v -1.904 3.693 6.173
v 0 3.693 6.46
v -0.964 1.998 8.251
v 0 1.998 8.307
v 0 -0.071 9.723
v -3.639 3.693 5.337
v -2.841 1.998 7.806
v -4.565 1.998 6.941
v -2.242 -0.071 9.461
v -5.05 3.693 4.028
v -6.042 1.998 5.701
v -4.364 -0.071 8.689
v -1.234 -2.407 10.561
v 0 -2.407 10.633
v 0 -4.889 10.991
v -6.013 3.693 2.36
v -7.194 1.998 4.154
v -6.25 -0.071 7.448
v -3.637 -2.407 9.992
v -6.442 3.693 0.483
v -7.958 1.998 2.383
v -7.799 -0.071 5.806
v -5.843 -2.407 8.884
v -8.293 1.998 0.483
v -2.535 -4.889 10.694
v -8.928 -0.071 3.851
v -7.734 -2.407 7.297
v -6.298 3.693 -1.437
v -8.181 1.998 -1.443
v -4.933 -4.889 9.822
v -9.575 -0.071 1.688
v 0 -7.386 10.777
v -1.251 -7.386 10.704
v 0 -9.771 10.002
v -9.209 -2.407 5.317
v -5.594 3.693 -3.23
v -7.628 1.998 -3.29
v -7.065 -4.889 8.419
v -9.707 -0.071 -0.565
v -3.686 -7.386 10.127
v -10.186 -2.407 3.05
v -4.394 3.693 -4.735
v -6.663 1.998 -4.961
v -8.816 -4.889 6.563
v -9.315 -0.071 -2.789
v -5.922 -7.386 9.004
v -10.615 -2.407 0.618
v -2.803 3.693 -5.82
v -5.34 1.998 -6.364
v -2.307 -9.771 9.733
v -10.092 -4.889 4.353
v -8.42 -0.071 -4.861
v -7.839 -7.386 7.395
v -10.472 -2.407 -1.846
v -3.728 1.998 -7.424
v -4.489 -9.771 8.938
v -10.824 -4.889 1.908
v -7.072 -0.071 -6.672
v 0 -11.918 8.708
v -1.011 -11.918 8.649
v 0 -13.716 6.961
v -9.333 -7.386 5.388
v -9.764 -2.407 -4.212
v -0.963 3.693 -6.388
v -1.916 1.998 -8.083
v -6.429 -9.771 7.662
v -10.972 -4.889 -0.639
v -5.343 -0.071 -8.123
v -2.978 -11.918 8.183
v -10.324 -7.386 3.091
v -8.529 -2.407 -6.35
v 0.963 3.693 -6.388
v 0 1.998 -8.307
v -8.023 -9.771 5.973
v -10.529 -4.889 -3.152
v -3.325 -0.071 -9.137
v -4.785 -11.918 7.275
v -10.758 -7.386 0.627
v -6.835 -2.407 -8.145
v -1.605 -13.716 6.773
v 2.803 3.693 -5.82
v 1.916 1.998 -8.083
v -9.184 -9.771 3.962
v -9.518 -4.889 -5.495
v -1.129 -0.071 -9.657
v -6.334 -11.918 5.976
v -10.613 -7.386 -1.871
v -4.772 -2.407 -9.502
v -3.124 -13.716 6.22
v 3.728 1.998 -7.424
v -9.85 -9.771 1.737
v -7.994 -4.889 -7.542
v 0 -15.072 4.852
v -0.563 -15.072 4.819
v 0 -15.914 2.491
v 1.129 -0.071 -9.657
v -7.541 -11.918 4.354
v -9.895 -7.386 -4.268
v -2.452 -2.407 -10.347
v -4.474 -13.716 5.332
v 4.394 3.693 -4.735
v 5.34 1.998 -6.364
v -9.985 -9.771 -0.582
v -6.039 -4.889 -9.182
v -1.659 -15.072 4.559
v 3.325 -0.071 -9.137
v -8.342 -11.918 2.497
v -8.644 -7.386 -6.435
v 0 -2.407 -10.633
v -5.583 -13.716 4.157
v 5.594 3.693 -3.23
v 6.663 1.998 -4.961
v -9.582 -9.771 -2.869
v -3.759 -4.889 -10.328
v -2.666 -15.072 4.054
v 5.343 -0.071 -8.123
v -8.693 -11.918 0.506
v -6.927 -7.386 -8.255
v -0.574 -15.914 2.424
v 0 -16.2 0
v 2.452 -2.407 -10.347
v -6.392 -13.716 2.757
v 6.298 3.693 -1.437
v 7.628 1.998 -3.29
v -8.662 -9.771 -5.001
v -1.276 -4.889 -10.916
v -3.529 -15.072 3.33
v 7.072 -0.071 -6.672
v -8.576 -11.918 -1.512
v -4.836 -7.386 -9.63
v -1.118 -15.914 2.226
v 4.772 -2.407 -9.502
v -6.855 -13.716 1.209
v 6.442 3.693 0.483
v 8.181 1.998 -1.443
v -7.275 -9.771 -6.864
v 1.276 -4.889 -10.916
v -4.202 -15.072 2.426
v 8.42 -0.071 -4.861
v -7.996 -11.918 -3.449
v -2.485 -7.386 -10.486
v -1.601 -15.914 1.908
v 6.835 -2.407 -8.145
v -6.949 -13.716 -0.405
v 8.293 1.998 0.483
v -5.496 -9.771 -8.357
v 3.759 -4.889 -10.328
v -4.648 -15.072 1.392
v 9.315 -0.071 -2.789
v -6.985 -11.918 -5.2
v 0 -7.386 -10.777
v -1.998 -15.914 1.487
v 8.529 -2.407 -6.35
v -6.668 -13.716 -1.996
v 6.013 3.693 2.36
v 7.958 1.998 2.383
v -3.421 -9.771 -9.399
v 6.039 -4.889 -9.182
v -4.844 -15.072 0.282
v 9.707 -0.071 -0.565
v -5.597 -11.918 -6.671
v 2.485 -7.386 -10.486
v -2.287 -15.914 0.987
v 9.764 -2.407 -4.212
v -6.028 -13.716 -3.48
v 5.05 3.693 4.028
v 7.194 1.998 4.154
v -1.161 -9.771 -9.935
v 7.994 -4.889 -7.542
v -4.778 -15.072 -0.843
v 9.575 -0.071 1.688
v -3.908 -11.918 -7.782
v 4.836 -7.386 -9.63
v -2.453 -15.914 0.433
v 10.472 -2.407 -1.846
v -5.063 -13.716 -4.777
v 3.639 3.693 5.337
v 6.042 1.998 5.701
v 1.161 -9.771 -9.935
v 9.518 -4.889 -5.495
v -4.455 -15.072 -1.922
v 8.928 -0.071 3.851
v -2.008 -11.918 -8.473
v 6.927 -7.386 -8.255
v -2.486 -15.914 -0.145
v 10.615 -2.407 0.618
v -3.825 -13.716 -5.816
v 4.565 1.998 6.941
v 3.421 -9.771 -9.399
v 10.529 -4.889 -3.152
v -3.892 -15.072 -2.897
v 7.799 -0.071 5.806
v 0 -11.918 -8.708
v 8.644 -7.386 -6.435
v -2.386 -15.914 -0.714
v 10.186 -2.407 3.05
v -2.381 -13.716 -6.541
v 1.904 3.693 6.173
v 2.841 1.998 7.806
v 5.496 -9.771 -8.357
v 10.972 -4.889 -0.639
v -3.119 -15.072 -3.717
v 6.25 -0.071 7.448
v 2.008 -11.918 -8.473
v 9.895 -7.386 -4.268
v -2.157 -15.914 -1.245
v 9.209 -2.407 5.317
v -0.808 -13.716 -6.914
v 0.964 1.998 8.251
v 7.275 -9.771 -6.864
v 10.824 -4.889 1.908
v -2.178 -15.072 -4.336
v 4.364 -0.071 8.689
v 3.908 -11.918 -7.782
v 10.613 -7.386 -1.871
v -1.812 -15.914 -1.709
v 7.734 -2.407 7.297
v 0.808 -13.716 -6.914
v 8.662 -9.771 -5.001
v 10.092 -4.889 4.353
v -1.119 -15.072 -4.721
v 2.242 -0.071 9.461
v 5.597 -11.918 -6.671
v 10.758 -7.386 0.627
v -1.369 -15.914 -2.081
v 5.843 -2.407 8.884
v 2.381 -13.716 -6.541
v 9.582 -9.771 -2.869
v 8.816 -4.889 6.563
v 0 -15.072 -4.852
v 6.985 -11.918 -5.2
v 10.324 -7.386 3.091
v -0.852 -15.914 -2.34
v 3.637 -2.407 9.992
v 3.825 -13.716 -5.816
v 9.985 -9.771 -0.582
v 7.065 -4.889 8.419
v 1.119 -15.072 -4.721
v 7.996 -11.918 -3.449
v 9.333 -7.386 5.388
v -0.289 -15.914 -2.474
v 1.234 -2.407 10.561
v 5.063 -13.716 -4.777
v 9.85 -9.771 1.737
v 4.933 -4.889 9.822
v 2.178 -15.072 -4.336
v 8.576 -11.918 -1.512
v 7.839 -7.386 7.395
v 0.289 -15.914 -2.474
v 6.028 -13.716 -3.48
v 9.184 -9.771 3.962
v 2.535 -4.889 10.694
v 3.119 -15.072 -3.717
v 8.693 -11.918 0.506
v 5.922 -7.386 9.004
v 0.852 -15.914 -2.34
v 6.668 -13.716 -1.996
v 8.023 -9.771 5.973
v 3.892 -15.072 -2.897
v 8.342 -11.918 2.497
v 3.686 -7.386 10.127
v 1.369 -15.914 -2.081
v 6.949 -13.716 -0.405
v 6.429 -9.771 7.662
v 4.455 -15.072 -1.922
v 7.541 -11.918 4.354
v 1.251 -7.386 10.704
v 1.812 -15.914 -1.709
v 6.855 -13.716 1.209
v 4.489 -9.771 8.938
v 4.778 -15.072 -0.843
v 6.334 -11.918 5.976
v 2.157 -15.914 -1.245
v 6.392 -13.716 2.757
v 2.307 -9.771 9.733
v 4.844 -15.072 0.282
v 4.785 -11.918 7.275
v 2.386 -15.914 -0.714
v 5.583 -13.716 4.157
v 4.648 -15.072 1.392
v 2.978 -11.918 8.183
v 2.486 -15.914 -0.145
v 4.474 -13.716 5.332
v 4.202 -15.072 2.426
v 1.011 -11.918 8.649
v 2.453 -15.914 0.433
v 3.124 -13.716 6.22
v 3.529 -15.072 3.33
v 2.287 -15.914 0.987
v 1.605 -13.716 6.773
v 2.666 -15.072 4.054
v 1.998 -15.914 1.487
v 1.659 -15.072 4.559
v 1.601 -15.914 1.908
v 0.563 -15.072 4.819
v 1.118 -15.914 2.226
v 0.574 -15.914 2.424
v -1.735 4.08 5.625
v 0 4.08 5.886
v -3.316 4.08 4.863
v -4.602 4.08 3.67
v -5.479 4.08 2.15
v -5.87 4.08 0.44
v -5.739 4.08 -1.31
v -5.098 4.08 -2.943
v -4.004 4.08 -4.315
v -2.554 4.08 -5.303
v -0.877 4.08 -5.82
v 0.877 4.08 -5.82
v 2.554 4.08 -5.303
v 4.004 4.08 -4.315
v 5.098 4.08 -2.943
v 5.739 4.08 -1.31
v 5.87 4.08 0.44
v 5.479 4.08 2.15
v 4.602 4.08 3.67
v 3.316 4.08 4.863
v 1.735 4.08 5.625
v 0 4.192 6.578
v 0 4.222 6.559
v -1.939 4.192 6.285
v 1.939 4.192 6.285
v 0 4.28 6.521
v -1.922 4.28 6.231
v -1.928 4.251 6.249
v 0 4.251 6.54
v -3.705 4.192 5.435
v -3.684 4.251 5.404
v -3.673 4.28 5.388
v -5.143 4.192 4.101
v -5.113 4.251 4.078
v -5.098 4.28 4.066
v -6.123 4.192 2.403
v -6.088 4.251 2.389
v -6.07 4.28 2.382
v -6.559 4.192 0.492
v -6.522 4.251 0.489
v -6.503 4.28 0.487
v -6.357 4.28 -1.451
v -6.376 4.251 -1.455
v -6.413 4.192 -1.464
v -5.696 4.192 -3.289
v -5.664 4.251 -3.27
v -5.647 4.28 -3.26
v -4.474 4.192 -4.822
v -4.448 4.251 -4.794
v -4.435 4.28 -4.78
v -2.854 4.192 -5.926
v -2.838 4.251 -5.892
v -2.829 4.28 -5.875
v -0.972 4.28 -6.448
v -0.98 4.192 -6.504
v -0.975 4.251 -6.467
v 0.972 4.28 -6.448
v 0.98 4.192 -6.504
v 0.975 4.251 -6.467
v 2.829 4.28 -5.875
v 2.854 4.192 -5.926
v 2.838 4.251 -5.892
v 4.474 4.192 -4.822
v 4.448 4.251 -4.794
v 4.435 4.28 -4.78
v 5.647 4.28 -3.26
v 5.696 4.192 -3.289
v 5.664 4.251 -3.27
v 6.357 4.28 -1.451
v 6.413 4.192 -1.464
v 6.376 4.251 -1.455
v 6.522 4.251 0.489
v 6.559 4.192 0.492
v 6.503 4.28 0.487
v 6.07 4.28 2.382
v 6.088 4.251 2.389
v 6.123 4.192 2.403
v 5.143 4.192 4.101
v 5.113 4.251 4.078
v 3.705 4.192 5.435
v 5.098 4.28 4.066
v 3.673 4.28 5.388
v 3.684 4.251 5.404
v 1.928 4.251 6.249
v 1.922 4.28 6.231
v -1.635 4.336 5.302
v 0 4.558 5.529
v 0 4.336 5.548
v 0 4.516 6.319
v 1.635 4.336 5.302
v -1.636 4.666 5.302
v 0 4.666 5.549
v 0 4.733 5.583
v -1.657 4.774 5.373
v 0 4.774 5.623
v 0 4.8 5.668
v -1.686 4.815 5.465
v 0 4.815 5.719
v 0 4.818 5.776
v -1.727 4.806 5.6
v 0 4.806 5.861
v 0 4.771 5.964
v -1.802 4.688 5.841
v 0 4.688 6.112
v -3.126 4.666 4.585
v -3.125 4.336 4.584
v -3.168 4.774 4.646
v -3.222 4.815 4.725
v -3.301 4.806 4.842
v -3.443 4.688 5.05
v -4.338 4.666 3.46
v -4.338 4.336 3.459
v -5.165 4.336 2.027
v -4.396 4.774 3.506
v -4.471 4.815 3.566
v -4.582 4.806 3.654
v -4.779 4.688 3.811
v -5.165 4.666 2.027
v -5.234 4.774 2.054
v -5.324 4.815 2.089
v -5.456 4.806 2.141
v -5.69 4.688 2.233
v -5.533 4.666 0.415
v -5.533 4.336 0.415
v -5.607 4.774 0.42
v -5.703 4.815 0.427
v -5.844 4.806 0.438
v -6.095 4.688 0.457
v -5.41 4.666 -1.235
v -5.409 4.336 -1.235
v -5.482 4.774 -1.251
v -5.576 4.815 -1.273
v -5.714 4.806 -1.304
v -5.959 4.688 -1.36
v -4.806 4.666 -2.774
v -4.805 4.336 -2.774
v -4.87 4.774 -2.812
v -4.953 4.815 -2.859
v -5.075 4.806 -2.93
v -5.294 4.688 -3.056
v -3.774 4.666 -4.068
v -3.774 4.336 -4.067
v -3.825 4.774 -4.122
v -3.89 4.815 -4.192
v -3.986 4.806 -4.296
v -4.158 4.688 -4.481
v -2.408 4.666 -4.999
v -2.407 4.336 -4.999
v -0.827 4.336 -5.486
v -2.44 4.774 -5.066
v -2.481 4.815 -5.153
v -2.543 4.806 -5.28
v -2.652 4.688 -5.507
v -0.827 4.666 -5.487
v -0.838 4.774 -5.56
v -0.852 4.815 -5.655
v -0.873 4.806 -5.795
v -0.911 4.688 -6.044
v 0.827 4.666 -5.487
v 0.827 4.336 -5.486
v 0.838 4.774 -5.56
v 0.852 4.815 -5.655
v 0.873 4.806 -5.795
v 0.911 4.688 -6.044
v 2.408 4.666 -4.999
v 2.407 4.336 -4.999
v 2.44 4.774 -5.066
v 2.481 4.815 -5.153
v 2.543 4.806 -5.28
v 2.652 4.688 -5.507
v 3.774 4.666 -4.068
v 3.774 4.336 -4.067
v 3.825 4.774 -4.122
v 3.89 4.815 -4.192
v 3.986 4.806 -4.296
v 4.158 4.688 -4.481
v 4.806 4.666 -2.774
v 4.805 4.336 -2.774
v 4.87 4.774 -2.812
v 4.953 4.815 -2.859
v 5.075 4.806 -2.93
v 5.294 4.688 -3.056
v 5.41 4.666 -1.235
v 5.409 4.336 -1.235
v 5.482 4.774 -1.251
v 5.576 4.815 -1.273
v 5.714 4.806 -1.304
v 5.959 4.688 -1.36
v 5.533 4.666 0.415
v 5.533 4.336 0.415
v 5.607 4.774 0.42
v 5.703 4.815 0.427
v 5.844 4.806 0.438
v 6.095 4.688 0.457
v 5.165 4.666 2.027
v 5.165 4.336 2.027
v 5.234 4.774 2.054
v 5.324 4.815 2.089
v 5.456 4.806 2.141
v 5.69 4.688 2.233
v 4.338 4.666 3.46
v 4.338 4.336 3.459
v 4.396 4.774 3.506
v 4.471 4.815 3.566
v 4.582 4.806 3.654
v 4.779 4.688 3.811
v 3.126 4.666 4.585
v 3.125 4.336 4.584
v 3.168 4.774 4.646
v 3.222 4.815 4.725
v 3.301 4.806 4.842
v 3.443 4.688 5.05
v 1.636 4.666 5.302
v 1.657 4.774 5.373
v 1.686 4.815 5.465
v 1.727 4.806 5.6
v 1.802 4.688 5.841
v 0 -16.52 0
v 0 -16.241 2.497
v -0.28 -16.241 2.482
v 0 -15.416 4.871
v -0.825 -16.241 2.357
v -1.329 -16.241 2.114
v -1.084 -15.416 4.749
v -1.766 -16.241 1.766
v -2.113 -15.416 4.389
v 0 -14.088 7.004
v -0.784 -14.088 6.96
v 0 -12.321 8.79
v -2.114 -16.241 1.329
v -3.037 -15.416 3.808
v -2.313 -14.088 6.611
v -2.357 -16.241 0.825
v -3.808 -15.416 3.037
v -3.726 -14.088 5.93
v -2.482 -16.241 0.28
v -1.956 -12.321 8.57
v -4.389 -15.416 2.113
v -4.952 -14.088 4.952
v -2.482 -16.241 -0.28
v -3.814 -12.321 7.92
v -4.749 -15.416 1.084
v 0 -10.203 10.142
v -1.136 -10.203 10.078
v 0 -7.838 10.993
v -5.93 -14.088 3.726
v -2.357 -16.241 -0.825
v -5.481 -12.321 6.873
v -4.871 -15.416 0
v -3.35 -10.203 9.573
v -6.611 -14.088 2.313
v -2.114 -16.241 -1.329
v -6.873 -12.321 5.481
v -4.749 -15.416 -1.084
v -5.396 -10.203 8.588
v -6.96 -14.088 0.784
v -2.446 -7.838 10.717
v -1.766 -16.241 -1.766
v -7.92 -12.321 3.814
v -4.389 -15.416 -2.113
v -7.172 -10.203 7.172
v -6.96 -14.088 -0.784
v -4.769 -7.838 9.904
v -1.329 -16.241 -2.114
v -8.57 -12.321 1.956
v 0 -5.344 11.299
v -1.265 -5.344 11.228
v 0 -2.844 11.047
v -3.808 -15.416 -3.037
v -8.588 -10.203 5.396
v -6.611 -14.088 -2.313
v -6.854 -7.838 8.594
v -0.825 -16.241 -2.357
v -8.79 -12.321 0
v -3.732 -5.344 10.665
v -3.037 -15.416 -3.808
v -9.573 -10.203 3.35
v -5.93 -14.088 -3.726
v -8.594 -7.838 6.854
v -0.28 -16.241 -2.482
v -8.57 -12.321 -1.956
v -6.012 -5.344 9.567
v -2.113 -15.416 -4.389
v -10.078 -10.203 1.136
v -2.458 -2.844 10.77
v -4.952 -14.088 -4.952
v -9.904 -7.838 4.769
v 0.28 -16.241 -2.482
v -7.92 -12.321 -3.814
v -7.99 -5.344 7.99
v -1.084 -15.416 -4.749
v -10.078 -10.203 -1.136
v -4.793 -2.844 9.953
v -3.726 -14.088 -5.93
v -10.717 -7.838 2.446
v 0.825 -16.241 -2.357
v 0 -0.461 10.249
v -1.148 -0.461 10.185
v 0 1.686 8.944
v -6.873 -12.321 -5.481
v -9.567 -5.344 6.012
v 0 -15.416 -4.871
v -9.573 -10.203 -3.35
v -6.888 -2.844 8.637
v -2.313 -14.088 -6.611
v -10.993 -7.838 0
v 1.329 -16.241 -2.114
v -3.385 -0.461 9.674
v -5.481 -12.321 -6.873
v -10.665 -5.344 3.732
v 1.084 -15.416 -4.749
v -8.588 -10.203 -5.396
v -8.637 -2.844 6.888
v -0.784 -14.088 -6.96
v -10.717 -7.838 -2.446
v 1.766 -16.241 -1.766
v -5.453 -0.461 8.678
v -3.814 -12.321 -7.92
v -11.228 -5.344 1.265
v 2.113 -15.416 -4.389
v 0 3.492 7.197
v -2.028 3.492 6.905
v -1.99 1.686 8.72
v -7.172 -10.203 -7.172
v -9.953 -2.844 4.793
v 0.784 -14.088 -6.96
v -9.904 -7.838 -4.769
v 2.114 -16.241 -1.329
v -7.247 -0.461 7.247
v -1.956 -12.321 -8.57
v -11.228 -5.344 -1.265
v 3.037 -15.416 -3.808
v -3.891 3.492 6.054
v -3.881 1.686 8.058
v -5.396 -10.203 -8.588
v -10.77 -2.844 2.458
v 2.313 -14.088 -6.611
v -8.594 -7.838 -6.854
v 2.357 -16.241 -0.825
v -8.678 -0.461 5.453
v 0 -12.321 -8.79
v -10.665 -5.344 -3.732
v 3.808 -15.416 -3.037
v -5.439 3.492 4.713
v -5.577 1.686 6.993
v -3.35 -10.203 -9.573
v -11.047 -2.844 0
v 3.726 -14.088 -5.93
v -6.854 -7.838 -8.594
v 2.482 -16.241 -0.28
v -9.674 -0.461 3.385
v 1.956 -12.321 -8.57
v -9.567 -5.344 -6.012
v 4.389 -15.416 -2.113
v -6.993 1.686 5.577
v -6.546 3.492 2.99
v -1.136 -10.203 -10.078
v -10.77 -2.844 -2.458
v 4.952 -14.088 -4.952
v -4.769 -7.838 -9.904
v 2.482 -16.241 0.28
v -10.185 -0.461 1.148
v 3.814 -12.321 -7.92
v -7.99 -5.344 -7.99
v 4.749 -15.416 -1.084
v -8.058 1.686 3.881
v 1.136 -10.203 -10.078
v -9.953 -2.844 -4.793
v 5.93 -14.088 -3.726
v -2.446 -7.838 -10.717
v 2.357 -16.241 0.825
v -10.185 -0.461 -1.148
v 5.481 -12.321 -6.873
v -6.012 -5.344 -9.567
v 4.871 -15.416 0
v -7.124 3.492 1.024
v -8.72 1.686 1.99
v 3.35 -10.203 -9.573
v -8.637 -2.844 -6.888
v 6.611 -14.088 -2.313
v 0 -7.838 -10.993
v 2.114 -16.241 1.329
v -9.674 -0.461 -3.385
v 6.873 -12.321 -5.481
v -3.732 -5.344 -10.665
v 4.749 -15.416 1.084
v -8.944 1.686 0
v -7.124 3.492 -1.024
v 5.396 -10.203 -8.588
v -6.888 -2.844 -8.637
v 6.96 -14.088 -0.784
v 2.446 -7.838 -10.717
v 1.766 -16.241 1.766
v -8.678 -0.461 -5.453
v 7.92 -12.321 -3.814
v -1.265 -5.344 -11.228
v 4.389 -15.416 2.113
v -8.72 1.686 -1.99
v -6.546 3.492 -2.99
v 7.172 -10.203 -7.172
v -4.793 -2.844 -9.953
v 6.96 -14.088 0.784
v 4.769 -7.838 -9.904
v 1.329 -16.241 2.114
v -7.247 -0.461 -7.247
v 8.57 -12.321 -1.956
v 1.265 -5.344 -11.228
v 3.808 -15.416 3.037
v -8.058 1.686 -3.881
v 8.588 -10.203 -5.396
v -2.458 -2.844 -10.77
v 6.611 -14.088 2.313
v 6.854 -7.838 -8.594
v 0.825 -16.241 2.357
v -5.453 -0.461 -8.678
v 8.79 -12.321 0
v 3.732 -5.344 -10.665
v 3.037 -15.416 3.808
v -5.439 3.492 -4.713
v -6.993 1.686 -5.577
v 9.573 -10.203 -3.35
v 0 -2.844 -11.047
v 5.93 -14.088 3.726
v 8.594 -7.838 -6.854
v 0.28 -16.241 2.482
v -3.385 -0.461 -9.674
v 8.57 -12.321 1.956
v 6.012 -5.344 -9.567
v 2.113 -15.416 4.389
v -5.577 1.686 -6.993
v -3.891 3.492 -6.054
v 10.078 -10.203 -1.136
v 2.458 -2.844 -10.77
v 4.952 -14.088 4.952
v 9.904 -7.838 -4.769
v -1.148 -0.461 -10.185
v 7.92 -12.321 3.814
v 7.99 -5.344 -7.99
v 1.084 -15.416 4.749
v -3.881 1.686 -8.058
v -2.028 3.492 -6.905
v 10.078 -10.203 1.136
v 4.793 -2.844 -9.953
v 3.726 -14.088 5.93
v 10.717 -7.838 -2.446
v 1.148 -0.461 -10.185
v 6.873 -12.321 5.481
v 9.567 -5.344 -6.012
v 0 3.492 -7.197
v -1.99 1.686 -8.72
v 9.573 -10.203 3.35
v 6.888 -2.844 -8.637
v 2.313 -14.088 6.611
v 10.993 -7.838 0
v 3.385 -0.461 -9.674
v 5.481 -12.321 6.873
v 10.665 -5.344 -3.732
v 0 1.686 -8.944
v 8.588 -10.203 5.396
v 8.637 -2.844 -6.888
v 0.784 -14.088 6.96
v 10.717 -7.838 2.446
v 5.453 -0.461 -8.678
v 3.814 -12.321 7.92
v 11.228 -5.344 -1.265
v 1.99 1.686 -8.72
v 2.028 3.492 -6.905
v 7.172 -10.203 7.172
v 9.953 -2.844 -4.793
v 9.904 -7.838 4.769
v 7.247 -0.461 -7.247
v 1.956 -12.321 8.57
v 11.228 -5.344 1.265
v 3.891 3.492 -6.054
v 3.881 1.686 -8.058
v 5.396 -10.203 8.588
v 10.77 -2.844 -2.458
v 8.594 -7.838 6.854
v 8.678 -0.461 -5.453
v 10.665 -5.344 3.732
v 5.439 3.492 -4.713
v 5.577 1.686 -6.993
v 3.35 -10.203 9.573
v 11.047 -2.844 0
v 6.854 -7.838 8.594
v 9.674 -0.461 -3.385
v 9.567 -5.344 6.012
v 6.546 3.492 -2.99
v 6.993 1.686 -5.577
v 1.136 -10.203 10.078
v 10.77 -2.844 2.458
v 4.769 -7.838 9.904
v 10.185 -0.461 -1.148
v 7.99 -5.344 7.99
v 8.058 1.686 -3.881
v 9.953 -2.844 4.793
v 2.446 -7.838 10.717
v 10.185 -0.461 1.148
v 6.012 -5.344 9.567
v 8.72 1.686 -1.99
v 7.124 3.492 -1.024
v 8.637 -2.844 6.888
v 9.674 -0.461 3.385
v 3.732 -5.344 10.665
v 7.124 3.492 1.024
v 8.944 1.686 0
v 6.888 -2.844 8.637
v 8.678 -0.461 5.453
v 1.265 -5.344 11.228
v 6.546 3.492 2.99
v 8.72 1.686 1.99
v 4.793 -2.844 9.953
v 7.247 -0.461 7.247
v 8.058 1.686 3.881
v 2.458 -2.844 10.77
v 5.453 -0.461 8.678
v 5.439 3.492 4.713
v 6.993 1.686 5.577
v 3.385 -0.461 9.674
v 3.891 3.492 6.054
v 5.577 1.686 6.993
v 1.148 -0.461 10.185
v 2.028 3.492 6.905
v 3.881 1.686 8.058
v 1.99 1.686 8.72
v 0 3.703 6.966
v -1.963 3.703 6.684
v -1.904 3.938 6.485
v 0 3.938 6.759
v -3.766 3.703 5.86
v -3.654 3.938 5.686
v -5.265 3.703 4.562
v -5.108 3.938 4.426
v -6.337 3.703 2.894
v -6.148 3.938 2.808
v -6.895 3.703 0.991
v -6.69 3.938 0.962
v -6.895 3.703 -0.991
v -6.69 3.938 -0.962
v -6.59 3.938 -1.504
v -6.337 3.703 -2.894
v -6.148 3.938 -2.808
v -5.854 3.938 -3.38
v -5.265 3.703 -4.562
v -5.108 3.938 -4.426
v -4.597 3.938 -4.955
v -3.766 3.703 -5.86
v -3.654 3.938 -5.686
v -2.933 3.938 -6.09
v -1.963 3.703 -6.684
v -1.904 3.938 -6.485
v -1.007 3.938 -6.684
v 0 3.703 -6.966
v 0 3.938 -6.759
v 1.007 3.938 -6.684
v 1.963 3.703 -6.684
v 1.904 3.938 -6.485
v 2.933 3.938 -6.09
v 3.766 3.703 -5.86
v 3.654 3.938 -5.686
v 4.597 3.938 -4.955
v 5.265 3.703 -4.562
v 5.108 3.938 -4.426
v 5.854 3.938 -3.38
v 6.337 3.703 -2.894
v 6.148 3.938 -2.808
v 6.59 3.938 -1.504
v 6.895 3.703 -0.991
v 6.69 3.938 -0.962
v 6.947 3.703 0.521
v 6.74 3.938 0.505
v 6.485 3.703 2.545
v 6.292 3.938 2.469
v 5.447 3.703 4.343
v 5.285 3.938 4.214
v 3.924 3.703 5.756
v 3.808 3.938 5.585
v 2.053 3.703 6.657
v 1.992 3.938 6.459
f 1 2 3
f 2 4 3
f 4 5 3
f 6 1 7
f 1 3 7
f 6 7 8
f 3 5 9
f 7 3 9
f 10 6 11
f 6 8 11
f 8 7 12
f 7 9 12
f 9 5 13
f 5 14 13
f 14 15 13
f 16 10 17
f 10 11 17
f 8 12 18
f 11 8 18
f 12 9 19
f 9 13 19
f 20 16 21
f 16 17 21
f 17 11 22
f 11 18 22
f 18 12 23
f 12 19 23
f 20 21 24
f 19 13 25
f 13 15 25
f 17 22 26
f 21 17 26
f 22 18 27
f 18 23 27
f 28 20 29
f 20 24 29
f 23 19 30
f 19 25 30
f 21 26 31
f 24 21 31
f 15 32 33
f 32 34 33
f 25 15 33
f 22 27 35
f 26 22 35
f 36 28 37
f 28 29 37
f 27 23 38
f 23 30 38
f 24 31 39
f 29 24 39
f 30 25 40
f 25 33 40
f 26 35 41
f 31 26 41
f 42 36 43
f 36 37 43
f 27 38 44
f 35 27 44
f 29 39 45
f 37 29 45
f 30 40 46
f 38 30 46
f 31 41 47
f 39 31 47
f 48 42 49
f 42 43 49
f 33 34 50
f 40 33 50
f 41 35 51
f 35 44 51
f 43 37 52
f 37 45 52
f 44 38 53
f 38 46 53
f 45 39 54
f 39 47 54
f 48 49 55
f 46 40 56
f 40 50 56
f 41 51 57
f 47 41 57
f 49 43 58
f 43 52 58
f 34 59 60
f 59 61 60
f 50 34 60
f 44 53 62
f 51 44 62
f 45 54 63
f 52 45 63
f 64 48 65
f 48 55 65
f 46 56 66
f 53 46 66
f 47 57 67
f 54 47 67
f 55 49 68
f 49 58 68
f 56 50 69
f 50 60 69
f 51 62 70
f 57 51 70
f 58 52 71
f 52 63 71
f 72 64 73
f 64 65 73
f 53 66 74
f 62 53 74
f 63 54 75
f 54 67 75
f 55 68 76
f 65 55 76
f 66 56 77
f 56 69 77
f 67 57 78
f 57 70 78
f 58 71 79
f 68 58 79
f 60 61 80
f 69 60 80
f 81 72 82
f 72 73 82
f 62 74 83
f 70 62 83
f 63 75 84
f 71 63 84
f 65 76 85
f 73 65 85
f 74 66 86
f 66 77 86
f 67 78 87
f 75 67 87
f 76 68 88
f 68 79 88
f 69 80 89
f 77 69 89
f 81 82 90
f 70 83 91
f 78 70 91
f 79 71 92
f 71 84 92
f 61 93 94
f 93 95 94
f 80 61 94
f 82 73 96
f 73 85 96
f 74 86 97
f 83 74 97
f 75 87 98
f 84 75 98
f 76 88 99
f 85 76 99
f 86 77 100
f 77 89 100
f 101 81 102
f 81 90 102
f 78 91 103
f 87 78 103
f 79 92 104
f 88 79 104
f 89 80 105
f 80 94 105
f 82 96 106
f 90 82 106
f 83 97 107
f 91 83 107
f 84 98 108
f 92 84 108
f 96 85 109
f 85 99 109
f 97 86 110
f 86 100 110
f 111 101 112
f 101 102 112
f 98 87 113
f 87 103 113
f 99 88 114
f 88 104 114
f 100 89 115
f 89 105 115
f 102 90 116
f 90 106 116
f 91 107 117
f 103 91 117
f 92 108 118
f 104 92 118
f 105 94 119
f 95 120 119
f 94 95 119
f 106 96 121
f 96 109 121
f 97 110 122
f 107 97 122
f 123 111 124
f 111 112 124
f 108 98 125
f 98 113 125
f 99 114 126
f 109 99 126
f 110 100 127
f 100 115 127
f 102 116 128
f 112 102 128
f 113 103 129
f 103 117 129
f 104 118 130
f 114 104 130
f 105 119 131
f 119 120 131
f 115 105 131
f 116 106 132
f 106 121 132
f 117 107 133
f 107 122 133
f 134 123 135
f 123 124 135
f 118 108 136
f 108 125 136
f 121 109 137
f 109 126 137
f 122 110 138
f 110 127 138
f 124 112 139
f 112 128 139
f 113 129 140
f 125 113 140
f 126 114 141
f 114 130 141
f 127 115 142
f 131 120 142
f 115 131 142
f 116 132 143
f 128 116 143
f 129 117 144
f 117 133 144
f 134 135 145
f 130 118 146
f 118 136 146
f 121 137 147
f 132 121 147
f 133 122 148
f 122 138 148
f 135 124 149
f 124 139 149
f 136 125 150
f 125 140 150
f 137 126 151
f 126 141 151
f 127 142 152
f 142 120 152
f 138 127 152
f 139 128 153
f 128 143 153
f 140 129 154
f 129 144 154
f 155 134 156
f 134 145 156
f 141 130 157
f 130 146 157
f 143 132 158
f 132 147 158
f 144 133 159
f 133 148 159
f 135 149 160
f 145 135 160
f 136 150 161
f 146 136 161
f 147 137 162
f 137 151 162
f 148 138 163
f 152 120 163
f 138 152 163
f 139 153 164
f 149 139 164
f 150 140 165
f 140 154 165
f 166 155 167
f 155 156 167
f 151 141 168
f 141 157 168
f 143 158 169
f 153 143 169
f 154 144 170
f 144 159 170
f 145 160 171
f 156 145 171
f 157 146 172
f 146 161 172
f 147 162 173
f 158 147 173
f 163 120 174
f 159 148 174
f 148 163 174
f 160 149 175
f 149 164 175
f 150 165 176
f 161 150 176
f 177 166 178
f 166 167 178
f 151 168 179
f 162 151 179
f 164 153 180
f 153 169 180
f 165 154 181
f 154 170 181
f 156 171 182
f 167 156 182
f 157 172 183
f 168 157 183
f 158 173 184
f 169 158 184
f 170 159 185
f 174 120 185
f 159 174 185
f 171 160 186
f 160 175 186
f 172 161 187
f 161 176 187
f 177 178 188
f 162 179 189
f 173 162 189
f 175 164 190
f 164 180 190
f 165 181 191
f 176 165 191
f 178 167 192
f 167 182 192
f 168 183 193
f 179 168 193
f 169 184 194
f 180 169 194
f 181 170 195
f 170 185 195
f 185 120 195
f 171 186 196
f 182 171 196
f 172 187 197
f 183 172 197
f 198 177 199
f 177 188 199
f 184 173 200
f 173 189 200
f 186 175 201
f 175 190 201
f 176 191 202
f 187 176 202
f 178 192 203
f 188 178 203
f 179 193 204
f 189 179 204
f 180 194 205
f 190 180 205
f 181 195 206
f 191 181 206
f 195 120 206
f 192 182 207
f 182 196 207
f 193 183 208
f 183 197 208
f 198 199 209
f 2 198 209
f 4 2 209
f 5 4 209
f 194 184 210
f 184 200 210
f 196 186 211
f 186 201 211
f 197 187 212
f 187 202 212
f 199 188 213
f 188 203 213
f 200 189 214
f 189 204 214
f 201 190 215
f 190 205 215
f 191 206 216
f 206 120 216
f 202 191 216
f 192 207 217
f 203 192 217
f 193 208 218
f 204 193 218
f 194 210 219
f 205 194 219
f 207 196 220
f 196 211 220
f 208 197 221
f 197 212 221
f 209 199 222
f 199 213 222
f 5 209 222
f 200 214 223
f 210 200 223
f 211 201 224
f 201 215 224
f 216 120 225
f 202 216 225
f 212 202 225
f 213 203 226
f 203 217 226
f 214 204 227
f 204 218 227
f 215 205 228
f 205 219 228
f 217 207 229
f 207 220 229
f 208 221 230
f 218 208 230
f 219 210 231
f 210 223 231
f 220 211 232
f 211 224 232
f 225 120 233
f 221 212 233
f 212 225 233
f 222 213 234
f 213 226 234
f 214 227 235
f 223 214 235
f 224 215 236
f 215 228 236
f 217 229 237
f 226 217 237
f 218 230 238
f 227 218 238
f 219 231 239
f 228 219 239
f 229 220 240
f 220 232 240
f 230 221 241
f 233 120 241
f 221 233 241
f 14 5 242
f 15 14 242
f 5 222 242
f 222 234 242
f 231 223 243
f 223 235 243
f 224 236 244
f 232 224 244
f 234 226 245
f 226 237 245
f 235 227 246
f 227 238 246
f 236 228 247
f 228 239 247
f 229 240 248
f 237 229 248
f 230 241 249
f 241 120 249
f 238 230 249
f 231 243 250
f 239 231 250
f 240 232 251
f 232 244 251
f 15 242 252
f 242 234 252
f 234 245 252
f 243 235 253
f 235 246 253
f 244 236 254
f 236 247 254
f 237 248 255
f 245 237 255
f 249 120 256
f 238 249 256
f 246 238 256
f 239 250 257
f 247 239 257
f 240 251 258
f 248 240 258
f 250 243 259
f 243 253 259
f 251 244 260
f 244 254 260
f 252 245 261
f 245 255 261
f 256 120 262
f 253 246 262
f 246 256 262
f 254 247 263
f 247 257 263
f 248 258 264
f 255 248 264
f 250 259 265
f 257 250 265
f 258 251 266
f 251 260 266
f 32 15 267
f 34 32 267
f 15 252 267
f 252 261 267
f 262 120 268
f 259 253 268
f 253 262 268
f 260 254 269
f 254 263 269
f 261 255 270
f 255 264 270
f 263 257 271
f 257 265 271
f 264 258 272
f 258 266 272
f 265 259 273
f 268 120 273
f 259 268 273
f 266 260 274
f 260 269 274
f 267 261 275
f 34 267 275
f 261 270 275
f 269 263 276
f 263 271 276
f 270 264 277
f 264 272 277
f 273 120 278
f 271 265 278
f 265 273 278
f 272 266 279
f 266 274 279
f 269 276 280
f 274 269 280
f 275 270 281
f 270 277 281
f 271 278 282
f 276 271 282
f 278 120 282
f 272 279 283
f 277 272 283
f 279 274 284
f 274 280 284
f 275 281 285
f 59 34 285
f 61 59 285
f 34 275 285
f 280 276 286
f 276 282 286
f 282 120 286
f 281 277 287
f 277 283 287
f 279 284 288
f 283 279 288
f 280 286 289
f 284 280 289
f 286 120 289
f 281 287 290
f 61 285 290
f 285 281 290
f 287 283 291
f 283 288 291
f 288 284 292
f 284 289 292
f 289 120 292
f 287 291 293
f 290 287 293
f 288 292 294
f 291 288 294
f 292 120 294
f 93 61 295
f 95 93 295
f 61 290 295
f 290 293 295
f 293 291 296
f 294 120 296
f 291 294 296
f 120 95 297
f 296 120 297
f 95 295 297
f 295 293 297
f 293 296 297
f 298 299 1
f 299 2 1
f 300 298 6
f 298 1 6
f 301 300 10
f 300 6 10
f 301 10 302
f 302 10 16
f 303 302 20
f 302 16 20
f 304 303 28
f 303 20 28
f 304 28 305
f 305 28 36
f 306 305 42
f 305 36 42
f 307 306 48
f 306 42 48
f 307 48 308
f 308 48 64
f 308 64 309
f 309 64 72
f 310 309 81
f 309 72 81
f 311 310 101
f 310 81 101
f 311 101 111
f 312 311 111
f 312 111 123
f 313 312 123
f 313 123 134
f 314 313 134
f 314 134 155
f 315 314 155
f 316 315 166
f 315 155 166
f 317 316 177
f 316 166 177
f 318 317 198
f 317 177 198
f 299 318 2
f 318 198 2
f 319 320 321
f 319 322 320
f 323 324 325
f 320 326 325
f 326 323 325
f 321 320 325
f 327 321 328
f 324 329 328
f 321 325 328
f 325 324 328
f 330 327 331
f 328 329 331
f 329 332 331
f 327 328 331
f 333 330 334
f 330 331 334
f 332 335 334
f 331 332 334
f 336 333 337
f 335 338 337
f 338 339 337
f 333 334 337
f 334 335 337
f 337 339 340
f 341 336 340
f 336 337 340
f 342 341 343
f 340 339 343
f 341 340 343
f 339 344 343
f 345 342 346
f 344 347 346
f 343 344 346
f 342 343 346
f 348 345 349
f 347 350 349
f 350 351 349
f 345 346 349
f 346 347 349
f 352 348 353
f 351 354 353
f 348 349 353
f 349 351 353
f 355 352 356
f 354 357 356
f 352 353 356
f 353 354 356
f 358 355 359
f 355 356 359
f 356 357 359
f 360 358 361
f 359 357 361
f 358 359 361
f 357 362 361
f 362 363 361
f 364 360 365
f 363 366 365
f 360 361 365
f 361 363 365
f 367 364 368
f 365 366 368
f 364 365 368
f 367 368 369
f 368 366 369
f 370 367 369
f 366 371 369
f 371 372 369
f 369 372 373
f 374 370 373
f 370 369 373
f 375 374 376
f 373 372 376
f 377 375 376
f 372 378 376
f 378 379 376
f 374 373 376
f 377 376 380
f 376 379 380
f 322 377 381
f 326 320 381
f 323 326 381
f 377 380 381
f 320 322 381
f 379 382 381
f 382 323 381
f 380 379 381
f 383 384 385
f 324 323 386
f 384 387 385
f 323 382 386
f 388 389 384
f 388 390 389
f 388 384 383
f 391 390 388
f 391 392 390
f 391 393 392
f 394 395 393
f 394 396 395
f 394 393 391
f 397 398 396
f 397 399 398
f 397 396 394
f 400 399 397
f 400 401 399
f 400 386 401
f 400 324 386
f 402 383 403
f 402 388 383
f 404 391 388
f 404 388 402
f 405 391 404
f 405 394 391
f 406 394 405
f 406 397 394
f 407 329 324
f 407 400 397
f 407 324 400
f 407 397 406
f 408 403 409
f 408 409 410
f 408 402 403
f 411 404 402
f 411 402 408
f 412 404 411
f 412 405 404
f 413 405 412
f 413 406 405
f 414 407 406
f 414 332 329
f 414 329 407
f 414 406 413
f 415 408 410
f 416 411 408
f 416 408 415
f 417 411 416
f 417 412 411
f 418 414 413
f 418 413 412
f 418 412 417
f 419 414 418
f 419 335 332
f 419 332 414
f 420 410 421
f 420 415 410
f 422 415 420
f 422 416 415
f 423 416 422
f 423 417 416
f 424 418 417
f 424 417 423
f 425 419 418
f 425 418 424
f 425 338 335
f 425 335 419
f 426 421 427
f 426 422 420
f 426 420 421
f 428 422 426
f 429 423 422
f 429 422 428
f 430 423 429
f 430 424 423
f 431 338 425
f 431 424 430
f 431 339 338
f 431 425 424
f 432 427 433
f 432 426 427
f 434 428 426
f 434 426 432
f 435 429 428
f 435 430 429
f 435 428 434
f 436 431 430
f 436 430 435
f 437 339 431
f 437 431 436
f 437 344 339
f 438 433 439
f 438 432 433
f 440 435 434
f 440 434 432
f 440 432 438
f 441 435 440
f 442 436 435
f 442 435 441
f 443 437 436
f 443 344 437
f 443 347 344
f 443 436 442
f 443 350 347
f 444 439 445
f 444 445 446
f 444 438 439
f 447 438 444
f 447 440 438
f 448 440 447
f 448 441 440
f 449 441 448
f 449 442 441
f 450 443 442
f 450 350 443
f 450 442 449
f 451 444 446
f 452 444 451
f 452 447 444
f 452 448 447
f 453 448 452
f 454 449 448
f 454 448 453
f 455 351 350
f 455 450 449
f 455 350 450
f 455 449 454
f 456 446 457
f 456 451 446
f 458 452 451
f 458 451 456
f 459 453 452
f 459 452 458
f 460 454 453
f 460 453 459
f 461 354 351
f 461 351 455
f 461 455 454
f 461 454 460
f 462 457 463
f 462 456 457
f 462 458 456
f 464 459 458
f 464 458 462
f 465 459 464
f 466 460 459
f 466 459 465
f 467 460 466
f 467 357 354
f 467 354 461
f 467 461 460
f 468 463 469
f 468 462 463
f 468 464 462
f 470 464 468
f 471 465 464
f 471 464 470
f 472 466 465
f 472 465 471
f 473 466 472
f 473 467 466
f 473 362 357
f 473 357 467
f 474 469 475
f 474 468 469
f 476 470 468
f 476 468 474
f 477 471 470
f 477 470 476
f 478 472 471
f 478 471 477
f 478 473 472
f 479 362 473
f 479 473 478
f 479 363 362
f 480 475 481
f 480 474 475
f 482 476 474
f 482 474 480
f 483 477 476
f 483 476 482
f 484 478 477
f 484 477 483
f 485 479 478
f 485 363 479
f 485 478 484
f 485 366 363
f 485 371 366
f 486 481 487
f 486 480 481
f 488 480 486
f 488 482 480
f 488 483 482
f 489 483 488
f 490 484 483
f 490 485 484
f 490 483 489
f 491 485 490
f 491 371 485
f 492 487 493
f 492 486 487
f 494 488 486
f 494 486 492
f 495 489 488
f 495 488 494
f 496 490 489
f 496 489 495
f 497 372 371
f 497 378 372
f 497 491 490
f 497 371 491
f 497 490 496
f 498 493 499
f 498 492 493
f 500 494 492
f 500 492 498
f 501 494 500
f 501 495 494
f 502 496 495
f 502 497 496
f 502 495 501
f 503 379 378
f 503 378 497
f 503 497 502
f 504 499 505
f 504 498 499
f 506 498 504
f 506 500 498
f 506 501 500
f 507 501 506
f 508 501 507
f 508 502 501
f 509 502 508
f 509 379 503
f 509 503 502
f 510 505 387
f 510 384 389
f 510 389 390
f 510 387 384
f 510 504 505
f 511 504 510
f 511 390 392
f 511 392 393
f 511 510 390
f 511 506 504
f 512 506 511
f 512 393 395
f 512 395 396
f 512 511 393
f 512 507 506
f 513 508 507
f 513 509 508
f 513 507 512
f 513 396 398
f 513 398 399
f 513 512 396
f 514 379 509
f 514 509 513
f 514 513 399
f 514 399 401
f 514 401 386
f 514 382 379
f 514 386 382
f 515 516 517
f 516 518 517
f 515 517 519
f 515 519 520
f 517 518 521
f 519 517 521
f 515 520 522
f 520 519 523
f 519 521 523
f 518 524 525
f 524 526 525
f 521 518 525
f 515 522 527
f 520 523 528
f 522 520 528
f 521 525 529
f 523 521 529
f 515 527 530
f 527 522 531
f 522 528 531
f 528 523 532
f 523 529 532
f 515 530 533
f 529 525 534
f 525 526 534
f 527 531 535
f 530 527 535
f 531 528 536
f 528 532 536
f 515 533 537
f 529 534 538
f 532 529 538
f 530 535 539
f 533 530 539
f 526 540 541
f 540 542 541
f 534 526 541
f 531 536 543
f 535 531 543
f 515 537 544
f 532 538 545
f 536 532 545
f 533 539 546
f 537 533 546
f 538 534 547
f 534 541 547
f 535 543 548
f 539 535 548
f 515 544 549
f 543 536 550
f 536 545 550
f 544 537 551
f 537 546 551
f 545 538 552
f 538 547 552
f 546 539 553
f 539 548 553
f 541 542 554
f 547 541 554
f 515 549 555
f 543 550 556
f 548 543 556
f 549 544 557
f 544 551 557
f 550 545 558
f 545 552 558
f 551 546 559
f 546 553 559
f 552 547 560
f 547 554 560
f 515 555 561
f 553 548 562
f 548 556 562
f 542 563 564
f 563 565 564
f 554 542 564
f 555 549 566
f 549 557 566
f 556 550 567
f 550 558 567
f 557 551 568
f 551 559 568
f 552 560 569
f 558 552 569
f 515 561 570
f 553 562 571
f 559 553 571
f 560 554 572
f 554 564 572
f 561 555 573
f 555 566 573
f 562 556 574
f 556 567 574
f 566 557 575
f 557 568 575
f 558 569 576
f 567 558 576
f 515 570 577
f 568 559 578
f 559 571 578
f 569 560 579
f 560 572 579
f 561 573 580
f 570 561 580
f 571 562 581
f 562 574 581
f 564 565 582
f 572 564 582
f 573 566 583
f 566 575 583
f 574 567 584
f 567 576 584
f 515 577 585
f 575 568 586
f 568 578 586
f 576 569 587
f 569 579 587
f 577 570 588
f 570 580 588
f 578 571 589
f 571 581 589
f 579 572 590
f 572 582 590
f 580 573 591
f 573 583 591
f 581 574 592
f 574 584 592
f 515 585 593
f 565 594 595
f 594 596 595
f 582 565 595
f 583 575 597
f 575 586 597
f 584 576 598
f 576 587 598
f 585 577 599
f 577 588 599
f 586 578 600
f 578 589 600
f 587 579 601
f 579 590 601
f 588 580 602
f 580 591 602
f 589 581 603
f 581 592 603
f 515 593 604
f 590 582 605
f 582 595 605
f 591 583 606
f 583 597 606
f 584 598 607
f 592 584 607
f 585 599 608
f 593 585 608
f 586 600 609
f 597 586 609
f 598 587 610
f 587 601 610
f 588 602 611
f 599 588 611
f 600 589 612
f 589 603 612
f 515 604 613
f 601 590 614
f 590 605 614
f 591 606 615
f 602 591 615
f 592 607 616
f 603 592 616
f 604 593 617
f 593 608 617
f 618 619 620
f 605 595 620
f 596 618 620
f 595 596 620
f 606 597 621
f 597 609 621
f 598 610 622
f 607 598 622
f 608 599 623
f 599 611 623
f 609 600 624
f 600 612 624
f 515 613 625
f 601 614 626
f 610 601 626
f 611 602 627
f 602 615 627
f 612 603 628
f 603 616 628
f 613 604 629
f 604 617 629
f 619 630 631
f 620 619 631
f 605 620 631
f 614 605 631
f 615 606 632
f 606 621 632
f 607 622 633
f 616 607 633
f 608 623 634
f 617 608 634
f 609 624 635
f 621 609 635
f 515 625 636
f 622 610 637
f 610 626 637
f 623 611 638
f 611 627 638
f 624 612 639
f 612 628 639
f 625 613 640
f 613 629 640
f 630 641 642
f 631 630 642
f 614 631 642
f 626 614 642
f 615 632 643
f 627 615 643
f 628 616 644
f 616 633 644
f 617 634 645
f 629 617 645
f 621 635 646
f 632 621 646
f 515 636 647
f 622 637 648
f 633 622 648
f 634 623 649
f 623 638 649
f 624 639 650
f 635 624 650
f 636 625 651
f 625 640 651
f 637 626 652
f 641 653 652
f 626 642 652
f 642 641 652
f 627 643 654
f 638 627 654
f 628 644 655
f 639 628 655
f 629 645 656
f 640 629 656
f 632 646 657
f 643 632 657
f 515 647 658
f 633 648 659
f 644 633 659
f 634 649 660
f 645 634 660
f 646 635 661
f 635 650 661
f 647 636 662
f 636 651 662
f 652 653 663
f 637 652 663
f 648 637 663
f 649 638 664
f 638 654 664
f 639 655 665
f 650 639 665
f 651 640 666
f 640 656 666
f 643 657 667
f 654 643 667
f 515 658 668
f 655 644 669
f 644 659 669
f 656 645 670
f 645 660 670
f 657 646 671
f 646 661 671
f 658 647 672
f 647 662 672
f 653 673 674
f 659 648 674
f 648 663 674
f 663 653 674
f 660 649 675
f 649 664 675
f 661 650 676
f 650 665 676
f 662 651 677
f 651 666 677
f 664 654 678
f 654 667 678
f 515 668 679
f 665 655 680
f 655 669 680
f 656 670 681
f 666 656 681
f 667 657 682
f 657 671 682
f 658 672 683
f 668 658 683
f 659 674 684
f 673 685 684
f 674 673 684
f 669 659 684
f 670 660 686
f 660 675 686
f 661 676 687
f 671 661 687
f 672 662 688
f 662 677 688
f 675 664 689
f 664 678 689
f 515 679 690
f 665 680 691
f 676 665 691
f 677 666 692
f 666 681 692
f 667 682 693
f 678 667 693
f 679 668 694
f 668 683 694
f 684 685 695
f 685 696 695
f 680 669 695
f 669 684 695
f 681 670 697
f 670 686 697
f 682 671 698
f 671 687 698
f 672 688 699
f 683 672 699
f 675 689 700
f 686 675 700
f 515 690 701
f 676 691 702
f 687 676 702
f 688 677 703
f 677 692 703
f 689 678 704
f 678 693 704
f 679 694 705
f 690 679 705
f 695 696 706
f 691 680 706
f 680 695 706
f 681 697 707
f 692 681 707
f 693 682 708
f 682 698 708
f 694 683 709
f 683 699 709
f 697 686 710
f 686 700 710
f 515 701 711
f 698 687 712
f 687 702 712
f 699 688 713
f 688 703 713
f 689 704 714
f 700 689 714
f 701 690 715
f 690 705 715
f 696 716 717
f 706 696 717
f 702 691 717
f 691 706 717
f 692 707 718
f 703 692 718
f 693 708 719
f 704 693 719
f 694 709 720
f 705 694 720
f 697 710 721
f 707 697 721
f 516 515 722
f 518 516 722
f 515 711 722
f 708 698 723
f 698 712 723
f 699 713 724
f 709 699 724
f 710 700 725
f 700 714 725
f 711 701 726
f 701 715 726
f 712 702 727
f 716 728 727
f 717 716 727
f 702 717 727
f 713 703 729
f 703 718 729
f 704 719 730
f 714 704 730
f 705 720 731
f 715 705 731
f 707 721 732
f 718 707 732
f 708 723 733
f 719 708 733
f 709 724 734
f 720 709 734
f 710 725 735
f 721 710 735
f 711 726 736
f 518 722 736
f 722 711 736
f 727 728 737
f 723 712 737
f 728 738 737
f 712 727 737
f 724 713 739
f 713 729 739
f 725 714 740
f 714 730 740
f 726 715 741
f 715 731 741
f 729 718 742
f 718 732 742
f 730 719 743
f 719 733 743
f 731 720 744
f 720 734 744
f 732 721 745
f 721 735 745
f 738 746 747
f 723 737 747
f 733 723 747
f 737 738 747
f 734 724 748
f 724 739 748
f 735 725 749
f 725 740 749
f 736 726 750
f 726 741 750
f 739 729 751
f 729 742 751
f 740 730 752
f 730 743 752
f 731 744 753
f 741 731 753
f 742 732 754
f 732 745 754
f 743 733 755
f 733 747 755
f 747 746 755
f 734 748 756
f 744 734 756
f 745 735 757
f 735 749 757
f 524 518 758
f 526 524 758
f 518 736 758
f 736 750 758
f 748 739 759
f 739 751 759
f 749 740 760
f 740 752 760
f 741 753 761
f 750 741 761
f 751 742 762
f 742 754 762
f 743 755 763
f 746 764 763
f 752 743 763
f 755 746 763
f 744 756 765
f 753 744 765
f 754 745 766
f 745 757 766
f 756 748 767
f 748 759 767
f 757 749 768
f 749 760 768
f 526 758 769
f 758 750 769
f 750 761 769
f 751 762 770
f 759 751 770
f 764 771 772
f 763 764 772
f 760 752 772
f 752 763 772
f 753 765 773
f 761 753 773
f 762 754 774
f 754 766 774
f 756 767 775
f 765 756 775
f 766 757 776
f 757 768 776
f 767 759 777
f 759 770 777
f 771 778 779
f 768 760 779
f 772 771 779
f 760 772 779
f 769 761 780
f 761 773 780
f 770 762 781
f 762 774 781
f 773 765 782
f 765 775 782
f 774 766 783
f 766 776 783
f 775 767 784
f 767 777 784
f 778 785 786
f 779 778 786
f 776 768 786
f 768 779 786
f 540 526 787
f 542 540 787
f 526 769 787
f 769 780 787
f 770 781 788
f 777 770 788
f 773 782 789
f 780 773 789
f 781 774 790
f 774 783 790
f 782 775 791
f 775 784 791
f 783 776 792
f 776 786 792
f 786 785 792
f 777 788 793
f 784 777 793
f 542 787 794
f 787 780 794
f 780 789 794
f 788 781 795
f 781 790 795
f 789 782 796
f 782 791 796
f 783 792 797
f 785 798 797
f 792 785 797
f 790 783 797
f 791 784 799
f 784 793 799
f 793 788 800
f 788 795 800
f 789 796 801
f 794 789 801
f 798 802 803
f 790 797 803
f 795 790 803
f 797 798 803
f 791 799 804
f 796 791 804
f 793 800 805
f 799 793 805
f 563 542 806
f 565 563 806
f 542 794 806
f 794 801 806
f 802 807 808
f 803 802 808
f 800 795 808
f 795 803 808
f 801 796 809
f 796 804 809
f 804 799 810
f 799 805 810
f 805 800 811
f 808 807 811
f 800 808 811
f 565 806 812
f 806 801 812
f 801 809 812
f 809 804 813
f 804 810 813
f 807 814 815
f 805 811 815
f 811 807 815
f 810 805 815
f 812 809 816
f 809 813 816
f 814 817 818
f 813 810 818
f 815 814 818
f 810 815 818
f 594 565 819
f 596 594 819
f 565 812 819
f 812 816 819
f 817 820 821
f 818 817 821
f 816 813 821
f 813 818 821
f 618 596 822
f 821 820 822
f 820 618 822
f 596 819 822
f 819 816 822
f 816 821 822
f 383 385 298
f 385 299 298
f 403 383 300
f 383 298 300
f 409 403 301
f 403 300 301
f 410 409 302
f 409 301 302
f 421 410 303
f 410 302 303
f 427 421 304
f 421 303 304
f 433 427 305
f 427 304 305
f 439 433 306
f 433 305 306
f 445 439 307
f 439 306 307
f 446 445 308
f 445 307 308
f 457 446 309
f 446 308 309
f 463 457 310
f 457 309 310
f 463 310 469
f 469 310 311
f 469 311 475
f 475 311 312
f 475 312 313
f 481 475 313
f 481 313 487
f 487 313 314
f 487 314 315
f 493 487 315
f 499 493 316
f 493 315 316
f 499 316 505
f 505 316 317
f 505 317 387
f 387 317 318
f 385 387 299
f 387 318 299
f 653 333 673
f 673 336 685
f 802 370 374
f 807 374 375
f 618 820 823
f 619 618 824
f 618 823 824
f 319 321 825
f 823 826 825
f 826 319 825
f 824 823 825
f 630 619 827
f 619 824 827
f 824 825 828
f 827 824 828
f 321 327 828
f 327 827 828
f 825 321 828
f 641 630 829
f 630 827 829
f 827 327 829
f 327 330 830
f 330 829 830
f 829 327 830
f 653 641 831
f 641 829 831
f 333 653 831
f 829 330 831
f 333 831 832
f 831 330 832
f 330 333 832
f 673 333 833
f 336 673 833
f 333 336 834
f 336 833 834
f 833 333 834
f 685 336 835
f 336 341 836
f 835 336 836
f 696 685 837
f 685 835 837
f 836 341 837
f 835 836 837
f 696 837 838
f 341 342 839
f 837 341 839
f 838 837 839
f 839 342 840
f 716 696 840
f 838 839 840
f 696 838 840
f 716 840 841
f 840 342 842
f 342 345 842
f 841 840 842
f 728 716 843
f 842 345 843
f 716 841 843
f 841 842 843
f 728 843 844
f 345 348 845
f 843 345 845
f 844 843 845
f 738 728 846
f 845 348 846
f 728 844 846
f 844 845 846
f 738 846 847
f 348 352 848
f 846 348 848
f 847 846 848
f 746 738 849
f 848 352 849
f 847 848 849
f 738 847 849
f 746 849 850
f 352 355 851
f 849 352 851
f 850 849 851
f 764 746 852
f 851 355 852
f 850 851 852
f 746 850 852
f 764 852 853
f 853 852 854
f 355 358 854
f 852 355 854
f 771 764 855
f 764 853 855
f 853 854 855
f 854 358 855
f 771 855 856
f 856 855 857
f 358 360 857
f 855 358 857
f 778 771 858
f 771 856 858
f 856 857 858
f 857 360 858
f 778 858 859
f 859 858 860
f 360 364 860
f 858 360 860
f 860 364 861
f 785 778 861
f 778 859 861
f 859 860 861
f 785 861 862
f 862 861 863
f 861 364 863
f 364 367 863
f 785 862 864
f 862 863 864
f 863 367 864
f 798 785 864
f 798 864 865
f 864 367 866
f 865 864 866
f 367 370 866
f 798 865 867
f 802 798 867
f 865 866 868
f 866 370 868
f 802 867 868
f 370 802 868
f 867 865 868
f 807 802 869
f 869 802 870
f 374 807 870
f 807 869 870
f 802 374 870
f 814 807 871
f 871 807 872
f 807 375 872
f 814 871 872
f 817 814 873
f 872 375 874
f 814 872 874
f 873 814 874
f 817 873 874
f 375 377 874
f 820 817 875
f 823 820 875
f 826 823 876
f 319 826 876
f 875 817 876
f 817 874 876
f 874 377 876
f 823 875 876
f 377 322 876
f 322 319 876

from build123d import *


with BuildPart() as part:
    # Sketch6 (on Front Plane) → sclera (revolve)
    with BuildSketch(Plane.XY):
        with BuildLine():
            Line((5.548153632, 4.336060606), (5.886123402, 4.08))
            Line((5.886123402, 4.08), (6.45968041, 3.692562089))
            ThreePointArc((6.45968041, 3.692562089), (10.457551069, -8.60076214), (0, -16.2))
            Line((0, -16.2), (0, -16.52))
            ThreePointArc((0, -16.52), (10.633298815, -9.043997424), (7.196762351, 3.491866142))
            ThreePointArc((7.196762351, 3.491866142), (6.859713943, 3.817824959), (6.577571883, 4.192320136))
            ThreePointArc((6.577571883, 4.192320136), (6.54936209, 4.236254975), (6.520858839, 4.28))
            add(Edge.make_bspline(
                [(5.548153632, 4.336060606), (5.40298249, 5.044933477), (6.051343216, 4.92625791), (6.520858839, 4.28)],
                knots=[0, 0, 0, 0, 1, 1, 1, 1], degree=3))
        make_face()
    revolve(axis=Axis((0, 6.398313168, 0), (0, -1, 0)))


solid = part.part
